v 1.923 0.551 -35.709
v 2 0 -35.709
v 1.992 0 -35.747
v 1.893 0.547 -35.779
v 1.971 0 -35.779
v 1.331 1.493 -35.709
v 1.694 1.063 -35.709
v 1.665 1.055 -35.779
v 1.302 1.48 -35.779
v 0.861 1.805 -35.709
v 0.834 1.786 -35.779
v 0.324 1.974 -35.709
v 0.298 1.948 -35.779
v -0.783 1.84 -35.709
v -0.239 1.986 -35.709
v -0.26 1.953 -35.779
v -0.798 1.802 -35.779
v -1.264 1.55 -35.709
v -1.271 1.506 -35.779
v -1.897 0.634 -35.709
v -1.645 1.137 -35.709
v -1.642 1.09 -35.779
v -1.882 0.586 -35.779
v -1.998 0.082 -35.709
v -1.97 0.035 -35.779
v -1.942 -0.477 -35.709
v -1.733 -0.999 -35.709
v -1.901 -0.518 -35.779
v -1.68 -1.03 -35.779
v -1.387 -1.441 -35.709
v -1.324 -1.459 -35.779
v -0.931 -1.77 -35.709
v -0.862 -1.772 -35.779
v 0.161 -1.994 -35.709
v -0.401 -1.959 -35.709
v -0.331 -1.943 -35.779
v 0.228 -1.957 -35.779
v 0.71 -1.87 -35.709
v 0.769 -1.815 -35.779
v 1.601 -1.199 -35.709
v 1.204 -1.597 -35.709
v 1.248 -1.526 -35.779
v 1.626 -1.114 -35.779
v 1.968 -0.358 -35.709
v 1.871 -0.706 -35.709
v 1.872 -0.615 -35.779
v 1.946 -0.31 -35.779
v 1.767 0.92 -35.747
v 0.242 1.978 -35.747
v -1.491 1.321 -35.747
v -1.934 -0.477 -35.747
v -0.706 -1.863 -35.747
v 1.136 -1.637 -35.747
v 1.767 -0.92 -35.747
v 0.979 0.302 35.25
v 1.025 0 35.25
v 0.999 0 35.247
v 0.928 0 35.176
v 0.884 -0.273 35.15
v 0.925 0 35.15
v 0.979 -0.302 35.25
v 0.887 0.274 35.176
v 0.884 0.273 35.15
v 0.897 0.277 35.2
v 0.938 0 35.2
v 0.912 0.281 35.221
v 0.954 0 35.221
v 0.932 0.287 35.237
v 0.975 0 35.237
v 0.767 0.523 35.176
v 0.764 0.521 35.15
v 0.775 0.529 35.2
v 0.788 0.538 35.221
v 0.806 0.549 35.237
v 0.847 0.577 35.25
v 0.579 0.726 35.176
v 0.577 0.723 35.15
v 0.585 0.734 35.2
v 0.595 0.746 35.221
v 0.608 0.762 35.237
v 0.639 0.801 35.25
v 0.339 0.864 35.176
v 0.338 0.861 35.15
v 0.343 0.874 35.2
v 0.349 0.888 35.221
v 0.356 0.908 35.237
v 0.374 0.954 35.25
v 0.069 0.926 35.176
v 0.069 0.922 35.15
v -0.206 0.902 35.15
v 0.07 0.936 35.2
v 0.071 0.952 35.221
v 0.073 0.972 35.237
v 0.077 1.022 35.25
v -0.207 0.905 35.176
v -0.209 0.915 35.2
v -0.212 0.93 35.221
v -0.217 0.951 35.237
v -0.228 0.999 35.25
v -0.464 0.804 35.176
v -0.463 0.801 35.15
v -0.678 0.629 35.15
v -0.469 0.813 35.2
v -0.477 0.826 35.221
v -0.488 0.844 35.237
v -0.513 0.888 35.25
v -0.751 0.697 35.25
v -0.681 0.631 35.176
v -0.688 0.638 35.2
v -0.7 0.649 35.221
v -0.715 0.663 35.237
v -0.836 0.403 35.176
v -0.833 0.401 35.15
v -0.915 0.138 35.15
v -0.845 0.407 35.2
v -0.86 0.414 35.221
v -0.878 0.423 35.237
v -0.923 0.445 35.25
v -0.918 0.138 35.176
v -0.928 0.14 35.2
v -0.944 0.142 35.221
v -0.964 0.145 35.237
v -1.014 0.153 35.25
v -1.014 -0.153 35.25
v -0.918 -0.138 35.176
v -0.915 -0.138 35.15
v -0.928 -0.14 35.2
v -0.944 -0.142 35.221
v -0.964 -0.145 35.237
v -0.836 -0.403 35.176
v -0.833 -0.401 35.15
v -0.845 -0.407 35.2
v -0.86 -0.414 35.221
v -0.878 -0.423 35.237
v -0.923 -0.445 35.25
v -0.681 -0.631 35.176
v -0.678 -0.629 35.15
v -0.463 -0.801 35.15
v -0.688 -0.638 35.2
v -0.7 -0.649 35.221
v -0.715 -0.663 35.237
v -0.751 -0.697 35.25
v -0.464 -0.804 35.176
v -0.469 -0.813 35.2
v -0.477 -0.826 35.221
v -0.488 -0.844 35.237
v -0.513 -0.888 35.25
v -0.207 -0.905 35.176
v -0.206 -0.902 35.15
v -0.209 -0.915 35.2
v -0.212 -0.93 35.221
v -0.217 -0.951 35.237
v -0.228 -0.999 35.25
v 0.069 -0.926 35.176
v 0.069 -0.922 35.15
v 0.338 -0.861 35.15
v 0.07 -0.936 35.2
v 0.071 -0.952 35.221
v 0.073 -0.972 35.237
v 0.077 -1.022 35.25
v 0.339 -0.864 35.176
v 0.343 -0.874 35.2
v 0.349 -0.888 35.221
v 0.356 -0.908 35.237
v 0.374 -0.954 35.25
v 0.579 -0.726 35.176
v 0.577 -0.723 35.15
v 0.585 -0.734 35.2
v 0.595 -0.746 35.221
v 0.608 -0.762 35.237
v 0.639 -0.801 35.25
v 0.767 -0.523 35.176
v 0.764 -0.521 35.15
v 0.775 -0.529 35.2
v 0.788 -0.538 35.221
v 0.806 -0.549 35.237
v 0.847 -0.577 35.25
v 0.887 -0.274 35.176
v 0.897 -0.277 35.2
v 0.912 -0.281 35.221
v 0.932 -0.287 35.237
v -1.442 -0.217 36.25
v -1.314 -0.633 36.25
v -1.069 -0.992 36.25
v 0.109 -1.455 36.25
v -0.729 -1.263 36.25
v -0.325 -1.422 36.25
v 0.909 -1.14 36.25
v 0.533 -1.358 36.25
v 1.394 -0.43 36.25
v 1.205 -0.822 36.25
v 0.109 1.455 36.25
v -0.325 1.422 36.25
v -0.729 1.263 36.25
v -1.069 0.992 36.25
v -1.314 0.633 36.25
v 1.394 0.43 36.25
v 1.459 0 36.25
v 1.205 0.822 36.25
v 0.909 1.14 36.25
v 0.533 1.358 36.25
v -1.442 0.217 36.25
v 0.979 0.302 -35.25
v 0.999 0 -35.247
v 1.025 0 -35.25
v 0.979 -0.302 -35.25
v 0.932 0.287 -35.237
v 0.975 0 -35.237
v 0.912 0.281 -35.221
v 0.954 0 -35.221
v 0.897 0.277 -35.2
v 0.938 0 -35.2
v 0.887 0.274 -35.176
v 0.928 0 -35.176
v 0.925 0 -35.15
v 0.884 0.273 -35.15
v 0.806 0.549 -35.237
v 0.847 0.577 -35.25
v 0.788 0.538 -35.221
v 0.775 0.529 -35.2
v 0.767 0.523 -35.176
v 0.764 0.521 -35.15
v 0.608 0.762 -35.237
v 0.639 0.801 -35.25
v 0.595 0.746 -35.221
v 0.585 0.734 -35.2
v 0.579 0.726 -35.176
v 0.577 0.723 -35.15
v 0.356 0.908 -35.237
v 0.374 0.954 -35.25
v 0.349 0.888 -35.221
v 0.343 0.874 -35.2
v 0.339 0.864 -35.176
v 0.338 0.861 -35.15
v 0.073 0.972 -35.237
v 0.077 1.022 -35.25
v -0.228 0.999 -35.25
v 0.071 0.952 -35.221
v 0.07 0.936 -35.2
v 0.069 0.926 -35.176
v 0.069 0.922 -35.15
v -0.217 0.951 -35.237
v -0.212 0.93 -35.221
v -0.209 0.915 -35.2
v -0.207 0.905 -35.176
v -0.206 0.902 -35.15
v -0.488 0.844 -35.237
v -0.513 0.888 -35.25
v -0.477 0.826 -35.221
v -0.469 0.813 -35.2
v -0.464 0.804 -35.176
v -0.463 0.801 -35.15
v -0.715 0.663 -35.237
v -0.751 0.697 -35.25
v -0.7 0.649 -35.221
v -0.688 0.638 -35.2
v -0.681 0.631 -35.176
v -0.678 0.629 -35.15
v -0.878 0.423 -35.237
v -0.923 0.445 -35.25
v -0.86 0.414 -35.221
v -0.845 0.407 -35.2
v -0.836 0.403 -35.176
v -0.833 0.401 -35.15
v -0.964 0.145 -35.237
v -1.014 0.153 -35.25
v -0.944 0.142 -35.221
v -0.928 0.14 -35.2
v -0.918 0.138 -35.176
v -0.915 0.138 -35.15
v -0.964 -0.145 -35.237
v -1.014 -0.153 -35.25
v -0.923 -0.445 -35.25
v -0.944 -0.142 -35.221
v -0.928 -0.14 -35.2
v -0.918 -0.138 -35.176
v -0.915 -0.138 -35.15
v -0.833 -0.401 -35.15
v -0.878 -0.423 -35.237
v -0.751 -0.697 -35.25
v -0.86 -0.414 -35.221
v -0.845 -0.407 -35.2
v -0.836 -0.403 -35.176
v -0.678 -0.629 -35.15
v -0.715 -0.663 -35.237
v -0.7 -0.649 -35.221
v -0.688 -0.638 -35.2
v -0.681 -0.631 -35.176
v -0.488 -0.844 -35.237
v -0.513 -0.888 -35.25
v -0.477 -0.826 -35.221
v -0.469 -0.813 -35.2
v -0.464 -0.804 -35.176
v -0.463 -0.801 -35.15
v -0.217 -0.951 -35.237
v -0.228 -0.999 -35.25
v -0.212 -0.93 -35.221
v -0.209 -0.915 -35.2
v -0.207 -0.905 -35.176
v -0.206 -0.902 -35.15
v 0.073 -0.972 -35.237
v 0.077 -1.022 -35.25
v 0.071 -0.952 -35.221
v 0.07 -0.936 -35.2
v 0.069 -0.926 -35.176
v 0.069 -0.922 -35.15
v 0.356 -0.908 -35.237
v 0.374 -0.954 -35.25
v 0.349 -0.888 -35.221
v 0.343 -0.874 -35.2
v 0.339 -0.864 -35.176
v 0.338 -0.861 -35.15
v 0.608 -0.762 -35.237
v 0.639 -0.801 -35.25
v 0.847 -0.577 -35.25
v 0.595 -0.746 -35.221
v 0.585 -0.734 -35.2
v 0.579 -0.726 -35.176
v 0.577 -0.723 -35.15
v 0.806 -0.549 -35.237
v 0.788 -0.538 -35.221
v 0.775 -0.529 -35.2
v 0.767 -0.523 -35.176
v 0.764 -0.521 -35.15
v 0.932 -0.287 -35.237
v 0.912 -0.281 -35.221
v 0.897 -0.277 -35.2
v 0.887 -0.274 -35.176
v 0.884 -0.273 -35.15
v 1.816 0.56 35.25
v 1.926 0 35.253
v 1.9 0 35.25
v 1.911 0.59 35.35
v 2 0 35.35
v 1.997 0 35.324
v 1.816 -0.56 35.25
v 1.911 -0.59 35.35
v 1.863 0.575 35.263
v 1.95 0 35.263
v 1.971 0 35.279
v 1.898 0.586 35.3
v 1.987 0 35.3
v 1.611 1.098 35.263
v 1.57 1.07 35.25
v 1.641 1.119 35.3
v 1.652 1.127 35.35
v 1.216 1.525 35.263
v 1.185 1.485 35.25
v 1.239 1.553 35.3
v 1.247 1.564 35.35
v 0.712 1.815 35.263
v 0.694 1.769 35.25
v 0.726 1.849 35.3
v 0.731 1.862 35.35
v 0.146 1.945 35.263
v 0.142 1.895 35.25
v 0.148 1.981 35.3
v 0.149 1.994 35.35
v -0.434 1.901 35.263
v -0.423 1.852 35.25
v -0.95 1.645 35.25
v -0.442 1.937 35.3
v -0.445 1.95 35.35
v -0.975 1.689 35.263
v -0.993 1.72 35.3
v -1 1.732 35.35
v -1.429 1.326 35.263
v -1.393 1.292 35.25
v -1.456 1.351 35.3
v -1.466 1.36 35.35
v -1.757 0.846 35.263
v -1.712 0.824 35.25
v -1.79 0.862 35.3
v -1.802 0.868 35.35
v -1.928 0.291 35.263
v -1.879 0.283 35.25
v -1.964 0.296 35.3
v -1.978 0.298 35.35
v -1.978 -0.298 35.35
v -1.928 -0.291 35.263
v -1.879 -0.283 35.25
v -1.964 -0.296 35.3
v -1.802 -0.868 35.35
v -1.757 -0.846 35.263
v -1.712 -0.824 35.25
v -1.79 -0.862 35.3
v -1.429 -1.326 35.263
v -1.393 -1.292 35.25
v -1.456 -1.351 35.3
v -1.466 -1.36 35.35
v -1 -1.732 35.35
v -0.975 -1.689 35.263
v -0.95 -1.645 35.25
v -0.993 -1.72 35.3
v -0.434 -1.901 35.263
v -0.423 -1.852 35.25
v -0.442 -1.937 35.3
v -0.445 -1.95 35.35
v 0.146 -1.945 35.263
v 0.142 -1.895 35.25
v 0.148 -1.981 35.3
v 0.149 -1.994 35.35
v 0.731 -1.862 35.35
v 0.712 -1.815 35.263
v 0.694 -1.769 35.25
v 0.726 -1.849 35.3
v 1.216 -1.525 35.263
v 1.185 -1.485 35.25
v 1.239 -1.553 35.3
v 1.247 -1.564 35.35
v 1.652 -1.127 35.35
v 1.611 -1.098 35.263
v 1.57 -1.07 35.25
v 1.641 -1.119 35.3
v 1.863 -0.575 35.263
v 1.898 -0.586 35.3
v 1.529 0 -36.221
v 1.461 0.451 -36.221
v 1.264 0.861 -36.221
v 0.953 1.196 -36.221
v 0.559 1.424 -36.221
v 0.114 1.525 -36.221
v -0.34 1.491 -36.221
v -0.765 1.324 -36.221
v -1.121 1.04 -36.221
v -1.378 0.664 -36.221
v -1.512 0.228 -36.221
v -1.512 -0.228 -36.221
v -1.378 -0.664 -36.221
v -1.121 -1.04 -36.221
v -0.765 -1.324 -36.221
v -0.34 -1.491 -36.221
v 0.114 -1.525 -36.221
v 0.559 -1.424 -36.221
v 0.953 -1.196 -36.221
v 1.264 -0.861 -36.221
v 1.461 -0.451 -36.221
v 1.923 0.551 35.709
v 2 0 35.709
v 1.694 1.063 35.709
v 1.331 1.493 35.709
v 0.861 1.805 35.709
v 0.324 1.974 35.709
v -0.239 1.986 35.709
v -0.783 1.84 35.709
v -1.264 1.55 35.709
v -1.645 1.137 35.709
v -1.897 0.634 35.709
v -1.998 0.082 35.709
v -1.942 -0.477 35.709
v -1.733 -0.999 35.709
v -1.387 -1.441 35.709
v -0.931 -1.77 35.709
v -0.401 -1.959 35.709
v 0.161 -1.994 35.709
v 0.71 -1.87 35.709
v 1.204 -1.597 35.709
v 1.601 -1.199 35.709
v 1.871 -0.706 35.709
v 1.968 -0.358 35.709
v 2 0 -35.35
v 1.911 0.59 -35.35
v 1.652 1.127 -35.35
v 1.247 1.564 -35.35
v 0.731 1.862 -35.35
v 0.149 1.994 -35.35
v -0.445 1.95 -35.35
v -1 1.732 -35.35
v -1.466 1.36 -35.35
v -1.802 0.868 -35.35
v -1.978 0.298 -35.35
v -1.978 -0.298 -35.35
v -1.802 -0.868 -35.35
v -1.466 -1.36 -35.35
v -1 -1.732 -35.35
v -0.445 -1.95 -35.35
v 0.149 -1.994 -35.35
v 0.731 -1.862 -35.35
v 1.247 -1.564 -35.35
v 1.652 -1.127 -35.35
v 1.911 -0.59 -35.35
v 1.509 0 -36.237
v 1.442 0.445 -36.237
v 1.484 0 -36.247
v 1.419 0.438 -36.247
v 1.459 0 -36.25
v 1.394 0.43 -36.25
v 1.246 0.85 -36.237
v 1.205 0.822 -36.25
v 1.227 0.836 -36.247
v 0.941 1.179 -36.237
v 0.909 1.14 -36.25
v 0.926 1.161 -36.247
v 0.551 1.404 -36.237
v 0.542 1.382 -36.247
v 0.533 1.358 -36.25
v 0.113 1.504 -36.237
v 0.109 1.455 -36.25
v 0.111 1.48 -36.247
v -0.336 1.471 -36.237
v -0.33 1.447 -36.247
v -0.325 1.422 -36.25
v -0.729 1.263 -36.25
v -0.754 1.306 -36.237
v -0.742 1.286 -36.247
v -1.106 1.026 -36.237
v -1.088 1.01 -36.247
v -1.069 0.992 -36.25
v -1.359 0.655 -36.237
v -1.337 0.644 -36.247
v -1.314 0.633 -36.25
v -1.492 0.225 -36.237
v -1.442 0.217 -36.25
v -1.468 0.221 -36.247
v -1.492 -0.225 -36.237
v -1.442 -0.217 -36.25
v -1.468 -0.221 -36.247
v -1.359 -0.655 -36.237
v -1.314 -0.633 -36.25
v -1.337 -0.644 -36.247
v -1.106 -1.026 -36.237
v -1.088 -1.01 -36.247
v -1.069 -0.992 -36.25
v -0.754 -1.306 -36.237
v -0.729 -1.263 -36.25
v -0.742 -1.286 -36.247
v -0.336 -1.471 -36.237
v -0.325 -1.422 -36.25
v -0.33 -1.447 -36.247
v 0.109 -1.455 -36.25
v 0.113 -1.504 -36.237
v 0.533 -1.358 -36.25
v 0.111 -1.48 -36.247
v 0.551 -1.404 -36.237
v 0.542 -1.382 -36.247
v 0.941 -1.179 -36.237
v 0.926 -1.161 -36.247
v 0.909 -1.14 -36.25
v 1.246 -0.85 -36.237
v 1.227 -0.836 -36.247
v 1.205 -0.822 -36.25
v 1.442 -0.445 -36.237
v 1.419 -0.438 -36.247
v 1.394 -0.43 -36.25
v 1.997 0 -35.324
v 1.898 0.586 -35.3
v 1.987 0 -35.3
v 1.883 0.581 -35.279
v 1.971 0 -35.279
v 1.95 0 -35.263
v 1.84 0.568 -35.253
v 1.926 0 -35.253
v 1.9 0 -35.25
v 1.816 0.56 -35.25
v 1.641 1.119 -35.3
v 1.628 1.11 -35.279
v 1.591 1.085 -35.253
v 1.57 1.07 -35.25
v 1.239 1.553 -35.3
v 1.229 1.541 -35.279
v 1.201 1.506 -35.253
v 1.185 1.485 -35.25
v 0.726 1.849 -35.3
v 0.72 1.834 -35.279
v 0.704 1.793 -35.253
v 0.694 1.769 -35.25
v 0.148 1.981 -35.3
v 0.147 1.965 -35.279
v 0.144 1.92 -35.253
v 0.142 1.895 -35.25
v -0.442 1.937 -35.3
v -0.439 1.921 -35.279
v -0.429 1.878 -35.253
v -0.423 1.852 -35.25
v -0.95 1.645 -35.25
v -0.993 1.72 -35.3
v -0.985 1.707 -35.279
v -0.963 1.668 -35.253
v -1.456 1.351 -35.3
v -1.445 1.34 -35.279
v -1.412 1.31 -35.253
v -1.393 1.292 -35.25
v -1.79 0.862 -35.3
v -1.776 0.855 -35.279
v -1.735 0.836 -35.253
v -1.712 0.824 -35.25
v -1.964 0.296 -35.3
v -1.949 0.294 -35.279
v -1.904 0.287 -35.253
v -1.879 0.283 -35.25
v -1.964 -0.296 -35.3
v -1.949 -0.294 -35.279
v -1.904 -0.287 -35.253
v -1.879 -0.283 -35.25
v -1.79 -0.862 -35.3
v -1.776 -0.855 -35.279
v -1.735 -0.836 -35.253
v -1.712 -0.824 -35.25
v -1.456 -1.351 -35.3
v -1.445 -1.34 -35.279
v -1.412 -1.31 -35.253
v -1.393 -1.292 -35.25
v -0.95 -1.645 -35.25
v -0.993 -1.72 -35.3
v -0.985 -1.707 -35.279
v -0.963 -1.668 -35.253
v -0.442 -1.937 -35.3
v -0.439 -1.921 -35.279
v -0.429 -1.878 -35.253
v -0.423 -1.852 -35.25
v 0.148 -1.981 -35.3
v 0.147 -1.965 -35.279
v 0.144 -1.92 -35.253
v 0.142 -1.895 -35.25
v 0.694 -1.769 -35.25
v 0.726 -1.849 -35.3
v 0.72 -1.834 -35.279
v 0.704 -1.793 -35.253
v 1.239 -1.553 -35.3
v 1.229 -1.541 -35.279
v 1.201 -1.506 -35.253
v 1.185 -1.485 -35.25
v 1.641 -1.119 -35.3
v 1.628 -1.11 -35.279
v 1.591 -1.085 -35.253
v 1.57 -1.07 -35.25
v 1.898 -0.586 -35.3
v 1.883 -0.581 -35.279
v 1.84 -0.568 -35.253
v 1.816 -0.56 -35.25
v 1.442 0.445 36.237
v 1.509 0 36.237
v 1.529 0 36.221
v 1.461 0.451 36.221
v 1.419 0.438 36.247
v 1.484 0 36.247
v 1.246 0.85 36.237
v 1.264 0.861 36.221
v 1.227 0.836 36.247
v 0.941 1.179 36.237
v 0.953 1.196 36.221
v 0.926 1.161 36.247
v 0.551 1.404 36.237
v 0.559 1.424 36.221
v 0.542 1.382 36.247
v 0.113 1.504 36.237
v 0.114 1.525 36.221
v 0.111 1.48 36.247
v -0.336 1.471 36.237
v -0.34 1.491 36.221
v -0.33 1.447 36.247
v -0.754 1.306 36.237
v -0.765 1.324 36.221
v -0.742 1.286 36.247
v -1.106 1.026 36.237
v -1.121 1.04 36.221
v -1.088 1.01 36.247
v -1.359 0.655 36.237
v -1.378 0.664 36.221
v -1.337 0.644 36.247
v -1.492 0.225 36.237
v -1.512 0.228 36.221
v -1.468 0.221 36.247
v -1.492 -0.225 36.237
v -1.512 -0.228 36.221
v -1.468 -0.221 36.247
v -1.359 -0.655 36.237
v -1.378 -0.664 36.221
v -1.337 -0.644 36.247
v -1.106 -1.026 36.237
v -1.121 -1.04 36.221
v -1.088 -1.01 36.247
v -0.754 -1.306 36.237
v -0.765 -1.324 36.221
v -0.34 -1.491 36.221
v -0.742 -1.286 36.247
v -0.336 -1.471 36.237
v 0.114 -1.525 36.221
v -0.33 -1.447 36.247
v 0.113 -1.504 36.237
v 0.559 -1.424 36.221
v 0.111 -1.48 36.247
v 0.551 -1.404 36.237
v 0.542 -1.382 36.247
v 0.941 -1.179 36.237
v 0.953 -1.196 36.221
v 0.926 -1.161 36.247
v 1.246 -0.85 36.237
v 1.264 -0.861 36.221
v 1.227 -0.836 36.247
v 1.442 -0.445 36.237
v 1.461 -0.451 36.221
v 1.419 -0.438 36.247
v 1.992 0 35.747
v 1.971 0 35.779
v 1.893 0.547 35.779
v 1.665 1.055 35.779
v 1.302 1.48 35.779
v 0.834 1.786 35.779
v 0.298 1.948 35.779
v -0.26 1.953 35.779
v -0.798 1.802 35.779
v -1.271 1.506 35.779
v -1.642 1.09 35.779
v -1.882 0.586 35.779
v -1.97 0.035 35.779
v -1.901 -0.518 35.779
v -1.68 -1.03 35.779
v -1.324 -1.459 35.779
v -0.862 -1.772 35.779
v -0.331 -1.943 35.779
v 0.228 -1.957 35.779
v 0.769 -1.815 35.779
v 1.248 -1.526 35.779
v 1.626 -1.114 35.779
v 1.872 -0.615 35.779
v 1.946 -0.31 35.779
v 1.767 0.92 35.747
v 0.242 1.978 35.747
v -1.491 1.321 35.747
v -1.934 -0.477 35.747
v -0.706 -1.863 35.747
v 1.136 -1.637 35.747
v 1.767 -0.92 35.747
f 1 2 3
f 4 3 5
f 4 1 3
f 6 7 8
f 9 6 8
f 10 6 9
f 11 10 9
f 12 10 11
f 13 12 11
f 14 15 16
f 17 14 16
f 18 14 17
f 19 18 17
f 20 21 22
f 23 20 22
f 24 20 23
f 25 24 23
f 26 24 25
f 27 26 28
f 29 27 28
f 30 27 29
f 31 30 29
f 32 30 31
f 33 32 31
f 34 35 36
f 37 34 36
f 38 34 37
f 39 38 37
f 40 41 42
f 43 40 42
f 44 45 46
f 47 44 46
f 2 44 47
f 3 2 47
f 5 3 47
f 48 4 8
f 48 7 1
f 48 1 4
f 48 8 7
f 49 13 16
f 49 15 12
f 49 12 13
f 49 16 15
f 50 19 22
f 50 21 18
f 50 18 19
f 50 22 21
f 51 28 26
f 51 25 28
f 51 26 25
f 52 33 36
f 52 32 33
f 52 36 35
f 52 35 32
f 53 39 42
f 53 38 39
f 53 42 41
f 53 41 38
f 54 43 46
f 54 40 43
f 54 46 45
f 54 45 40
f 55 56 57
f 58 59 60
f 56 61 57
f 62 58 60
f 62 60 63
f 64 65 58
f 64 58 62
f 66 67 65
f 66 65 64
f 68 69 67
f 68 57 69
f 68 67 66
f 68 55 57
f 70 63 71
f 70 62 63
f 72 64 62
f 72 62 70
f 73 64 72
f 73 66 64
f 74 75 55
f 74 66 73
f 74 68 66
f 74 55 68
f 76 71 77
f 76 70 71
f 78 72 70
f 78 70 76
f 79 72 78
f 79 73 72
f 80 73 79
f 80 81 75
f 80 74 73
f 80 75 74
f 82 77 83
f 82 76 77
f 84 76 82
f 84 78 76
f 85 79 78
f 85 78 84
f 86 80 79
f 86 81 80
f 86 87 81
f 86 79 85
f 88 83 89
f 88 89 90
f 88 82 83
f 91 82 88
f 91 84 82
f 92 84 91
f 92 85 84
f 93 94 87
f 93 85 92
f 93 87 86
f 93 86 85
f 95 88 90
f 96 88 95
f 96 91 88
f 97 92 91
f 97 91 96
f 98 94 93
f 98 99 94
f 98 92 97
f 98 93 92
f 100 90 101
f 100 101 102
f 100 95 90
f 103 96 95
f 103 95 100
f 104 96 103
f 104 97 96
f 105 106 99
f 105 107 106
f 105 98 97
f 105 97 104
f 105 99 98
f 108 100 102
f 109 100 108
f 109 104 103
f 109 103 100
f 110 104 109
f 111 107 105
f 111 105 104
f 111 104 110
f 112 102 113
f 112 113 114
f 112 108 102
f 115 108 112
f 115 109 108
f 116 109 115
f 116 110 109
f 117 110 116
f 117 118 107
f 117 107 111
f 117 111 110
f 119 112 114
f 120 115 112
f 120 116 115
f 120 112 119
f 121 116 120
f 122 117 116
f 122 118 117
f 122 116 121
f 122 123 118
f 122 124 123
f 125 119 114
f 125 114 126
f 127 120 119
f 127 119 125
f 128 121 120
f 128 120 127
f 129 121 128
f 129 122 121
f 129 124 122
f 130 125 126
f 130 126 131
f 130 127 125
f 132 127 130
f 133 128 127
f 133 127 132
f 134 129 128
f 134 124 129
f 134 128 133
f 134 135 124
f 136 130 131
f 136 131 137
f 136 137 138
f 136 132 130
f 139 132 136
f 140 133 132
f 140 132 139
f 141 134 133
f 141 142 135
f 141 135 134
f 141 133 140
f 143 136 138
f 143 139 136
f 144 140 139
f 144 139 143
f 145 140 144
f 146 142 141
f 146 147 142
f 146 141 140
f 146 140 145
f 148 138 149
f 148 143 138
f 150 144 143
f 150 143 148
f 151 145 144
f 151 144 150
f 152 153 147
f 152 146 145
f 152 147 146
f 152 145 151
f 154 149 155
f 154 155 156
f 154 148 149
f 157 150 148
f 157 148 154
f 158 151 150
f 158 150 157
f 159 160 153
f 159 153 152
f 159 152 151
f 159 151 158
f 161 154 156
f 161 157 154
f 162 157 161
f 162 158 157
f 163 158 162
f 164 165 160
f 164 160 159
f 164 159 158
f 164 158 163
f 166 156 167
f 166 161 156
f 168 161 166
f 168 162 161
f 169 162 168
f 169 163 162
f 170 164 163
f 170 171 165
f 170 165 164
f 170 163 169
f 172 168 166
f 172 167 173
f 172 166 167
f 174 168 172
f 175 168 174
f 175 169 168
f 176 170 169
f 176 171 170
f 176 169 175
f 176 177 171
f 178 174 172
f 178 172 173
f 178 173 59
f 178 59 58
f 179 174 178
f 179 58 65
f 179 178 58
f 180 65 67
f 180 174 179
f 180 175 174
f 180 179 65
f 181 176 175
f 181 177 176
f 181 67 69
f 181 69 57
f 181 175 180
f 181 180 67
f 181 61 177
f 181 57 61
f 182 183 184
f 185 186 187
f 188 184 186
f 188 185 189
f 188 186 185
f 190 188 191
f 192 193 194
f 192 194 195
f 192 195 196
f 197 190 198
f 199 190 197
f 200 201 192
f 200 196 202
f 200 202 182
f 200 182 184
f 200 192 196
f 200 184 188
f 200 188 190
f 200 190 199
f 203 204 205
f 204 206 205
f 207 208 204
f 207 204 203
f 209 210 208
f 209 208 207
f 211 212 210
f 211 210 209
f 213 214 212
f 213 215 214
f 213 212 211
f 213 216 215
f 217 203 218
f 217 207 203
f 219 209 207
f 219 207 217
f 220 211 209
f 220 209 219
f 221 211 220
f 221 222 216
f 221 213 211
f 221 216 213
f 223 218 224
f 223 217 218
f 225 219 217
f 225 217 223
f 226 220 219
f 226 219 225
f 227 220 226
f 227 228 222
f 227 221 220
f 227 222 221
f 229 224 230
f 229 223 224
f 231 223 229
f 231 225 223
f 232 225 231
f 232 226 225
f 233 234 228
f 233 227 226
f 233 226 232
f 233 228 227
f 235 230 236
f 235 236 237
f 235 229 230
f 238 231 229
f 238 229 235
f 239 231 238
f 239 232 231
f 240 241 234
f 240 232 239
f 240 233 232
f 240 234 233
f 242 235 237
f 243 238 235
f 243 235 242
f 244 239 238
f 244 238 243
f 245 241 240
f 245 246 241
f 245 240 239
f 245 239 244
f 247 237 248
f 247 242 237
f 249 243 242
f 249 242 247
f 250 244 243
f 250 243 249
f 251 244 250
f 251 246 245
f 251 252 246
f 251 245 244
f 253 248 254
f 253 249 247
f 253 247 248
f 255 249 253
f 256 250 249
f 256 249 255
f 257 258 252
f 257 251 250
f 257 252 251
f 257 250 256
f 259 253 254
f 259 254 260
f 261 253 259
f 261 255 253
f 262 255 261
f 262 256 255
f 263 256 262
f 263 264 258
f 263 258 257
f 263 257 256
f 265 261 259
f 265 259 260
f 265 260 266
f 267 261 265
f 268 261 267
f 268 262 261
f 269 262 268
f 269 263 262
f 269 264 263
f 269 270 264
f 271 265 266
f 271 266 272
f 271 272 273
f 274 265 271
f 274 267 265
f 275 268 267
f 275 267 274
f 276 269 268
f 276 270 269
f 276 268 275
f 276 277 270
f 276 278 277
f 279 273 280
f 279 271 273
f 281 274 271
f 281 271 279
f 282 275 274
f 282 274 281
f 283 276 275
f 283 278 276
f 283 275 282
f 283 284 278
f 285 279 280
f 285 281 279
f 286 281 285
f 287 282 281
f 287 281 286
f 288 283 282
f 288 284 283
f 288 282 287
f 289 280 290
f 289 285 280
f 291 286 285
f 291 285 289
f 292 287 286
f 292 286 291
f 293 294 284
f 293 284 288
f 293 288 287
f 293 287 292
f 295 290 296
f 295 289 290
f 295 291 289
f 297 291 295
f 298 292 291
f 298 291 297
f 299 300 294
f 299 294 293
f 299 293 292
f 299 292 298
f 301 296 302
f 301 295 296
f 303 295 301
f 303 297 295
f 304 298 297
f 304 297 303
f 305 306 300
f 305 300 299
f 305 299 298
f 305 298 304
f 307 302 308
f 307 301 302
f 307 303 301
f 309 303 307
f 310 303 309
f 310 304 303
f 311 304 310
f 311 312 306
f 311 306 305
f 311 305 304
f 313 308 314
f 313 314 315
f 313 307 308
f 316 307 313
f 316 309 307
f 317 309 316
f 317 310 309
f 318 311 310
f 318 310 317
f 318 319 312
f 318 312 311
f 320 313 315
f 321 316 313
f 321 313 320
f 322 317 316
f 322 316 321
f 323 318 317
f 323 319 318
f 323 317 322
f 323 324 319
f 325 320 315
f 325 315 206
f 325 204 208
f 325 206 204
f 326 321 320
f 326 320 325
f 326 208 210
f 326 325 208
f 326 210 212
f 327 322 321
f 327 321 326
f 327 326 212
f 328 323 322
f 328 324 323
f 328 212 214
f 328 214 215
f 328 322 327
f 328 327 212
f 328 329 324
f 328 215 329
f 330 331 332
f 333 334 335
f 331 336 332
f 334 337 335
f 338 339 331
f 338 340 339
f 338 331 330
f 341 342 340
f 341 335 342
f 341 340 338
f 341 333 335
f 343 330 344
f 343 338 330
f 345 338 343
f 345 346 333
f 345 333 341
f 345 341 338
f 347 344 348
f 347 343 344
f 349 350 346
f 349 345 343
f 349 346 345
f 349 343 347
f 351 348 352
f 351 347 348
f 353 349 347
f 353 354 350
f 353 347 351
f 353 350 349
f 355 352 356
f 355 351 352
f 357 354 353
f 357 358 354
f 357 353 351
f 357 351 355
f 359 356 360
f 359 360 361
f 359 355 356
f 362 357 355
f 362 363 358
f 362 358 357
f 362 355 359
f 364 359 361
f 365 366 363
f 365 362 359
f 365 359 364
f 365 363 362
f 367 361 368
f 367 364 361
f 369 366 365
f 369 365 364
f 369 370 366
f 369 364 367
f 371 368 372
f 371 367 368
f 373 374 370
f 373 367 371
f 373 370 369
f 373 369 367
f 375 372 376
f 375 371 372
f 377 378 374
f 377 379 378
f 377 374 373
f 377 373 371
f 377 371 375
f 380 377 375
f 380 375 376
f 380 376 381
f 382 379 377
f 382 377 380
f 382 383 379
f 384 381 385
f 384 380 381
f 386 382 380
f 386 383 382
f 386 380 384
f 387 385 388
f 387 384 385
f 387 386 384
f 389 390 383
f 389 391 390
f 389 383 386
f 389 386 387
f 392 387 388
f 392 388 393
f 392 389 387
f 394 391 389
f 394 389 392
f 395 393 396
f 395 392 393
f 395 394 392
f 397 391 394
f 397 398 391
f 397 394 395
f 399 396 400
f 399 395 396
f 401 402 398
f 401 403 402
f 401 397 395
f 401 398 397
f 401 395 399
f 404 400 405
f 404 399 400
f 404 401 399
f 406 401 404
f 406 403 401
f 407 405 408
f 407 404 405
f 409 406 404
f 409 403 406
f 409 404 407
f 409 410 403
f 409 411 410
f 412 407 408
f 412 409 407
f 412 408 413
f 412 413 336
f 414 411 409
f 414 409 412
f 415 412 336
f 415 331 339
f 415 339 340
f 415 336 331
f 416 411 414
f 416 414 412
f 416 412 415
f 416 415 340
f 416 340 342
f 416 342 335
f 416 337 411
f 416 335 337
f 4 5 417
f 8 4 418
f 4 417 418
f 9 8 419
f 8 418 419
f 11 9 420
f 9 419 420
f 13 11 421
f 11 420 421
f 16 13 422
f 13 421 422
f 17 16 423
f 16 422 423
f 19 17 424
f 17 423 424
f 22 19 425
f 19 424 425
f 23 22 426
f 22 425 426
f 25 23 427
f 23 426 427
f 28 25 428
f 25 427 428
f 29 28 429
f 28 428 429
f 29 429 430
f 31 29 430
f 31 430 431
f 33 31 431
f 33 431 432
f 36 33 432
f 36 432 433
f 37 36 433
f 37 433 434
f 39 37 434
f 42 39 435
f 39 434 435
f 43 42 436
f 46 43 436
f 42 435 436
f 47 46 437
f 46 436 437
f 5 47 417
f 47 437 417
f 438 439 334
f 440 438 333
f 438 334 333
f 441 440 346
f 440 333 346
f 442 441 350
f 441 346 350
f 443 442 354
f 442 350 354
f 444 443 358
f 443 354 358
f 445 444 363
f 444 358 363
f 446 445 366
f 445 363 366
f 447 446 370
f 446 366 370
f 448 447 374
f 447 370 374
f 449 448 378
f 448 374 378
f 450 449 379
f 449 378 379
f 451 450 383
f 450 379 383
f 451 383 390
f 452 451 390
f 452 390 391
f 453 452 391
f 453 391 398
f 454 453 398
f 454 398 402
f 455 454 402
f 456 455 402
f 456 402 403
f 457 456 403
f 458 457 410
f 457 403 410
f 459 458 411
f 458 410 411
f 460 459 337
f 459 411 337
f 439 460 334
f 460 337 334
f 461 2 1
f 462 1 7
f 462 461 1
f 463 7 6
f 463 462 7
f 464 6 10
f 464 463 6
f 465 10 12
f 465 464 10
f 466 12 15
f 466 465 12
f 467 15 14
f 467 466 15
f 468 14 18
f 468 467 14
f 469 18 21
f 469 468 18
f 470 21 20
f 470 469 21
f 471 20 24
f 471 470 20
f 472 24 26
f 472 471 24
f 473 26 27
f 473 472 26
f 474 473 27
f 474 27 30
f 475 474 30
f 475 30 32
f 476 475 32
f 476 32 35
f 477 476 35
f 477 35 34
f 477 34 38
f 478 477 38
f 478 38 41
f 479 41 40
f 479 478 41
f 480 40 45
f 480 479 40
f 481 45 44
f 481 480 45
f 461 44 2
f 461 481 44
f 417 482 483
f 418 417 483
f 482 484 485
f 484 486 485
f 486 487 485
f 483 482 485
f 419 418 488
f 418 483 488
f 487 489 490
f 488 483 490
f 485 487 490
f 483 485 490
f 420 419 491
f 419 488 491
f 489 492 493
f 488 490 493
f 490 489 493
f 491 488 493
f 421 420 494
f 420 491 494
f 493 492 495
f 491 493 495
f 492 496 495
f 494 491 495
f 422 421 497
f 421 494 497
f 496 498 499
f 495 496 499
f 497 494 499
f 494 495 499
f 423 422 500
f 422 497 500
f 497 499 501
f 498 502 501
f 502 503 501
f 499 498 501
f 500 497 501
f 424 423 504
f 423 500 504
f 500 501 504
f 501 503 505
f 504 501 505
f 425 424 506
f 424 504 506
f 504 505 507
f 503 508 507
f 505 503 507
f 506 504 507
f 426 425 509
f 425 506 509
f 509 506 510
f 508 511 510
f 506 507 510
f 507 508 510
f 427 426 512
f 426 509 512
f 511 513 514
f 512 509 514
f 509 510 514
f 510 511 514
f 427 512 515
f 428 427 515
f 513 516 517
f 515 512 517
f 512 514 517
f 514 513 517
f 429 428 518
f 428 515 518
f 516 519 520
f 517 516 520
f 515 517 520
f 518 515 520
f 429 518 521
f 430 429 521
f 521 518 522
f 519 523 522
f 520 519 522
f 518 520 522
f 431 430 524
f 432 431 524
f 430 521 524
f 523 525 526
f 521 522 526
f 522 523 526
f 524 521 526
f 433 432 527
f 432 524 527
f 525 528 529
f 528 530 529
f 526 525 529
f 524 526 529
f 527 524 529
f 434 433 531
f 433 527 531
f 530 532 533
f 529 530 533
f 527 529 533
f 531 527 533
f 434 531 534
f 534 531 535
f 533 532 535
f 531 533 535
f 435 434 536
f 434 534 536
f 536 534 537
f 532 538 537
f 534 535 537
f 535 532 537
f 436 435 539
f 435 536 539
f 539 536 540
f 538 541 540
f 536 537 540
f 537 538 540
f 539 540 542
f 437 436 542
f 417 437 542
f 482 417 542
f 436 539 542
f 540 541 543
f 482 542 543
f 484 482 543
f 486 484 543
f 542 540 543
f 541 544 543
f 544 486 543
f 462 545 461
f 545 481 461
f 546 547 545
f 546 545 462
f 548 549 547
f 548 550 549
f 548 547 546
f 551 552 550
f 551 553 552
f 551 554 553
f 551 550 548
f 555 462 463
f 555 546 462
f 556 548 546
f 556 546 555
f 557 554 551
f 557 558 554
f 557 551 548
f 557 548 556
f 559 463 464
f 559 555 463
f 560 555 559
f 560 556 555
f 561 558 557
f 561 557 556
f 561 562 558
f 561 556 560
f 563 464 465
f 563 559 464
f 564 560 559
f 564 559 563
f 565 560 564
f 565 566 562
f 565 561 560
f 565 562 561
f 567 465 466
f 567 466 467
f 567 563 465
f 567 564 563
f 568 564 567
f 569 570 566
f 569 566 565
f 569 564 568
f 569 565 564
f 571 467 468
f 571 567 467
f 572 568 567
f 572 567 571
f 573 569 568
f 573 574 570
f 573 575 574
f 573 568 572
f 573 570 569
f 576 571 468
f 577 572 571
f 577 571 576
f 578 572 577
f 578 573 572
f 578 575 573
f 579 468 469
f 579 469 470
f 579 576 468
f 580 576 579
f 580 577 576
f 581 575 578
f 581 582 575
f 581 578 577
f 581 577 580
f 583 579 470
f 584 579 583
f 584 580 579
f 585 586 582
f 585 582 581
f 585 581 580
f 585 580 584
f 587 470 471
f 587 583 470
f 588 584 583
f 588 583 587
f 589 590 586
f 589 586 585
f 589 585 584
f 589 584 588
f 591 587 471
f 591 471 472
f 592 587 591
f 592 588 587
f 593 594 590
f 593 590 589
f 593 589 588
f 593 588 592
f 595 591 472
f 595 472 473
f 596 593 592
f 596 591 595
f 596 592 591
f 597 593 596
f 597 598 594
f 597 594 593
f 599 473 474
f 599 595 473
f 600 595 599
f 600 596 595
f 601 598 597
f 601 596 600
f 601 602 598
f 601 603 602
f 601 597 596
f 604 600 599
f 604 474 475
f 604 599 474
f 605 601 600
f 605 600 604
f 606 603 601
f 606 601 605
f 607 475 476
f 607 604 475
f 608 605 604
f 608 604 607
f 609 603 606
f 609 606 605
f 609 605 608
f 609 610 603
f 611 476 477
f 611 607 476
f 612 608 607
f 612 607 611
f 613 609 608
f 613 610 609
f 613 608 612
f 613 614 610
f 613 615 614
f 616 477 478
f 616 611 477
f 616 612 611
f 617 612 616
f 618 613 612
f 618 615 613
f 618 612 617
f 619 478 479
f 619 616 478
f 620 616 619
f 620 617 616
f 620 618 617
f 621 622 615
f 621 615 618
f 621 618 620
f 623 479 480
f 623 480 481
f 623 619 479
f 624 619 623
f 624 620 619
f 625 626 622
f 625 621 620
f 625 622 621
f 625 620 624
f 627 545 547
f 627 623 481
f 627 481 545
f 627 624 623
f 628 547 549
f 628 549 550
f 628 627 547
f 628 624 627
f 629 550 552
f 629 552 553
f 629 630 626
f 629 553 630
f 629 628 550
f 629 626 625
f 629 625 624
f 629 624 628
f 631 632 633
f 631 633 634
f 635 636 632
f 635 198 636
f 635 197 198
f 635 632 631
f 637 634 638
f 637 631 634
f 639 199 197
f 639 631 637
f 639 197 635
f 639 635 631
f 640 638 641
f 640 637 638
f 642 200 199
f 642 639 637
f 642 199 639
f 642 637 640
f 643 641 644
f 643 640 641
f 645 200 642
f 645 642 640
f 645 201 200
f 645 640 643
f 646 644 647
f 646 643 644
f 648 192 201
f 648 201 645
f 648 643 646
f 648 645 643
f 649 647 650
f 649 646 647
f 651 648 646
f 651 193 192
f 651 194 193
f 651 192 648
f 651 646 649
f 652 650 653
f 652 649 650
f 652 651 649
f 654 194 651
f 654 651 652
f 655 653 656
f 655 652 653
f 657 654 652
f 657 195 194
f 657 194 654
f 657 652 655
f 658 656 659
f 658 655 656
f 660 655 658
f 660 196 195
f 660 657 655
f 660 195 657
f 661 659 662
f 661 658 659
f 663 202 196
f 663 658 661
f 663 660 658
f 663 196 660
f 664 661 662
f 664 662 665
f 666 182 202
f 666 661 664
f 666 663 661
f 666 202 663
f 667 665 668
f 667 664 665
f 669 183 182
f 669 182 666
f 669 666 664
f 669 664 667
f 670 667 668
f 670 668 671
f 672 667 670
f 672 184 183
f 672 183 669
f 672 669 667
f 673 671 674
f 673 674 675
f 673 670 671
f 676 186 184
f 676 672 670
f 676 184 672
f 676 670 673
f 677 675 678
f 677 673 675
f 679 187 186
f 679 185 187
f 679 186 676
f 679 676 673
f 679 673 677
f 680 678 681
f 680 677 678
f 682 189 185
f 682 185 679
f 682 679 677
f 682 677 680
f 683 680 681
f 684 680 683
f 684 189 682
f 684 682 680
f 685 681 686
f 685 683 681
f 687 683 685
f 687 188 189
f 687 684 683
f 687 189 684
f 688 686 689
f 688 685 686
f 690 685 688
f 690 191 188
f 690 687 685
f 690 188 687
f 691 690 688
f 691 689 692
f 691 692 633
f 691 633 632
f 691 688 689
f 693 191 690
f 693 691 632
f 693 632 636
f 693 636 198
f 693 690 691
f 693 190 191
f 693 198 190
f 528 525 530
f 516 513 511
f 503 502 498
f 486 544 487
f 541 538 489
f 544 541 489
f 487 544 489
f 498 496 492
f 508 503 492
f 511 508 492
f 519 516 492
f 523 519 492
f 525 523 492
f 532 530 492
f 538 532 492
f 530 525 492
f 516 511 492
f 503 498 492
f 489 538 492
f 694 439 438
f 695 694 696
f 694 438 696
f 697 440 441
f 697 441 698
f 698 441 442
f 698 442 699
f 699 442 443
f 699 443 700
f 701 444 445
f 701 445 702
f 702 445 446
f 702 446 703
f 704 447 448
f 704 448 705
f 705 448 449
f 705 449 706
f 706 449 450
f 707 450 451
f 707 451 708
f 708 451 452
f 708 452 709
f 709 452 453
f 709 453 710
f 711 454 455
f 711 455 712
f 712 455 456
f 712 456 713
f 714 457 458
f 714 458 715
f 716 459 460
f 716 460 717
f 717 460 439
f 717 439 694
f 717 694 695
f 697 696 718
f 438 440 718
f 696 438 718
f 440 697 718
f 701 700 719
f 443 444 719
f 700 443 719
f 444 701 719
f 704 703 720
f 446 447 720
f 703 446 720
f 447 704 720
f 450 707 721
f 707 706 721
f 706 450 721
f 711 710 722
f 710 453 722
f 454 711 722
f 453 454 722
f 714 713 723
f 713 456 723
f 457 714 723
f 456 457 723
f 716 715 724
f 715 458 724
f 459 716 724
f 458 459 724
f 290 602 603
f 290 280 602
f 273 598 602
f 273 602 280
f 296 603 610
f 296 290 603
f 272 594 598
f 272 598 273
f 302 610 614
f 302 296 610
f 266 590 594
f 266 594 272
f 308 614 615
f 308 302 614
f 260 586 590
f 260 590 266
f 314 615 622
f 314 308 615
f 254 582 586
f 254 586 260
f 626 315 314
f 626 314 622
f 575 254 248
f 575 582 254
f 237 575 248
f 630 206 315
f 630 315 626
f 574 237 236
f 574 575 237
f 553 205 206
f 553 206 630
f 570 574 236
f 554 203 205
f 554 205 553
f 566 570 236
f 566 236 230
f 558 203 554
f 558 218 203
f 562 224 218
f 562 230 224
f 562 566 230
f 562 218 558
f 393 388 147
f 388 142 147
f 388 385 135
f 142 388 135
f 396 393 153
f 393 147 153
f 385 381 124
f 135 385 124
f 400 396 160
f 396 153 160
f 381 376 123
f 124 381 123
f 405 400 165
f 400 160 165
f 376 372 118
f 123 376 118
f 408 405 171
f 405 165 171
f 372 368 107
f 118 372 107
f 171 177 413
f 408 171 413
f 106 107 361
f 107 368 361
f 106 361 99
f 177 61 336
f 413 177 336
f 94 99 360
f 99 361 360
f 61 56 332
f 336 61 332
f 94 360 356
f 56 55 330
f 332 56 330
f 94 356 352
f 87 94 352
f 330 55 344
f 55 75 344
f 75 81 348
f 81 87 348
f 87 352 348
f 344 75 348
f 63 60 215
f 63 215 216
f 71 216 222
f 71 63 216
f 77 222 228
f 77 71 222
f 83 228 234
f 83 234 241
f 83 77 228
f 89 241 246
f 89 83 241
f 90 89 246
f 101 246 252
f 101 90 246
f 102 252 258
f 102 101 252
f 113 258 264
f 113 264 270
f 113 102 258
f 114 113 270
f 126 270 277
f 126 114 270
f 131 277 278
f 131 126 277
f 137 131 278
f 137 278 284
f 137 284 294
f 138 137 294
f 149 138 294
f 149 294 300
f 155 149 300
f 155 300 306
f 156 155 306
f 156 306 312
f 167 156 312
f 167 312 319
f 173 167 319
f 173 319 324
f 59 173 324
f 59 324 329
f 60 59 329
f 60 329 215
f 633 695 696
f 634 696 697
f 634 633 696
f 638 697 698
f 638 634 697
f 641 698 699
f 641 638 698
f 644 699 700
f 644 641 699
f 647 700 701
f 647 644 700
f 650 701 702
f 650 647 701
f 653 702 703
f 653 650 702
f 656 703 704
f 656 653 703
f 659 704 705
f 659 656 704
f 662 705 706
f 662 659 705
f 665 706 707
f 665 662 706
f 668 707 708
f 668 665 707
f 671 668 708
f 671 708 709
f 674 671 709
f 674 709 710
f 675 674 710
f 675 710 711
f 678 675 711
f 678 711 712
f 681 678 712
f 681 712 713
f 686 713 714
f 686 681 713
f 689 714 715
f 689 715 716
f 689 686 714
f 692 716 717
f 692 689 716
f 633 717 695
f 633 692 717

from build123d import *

# Parameters (mm, degrees)
SKETCH1_R           = 0.925
BOSS_EXTRUDE1_DEPTH = 35.25
SKETCH2_R           = 2
BOSS_EXTRUDE2_DEPTH = 1
CHAMFER1_SIZE       = 0.5
FILLET1_R           = 0.1


with BuildPart() as part:
    # Sketch1 → Boss-Extrude1 (new body)
    with BuildSketch(Plane.XY):
        Circle(SKETCH1_R)
    extrude(amount=BOSS_EXTRUDE1_DEPTH)

    # Sketch2 → Boss-Extrude2 (add)
    with BuildSketch(Plane.XY.offset(35.25)):
        Circle(SKETCH2_R)
    extrude(amount=BOSS_EXTRUDE2_DEPTH)

    # Chamfer1
    chamfer1_edges = [part.edges().sort_by_distance(p)[0] for p in [
        (-2, 0, 36.25),
    ]]
    chamfer(chamfer1_edges, length=CHAMFER1_SIZE)

    # Mirror1: part across plane


with BuildPart() as part_1:
    add(part.part)
    add(part.part.mirror(Plane.XY))

    # Fillet1
    fillet1_edges = [part_1.edges().sort_by_distance(p)[0] for p in [
        (-2, 0, 35.75),
        (-0.925, 0, -35.25),
        (-2, 0, -35.25),
        (-2, 0, -35.75),
        (-1.5, 0, -36.25),
        (-0.925, 0, 35.25),
        (-2, 0, 35.25),
        (-1.5, 0, 36.25),
    ]]
    fillet(fillet1_edges, radius=FILLET1_R)


solid = part_1.part
